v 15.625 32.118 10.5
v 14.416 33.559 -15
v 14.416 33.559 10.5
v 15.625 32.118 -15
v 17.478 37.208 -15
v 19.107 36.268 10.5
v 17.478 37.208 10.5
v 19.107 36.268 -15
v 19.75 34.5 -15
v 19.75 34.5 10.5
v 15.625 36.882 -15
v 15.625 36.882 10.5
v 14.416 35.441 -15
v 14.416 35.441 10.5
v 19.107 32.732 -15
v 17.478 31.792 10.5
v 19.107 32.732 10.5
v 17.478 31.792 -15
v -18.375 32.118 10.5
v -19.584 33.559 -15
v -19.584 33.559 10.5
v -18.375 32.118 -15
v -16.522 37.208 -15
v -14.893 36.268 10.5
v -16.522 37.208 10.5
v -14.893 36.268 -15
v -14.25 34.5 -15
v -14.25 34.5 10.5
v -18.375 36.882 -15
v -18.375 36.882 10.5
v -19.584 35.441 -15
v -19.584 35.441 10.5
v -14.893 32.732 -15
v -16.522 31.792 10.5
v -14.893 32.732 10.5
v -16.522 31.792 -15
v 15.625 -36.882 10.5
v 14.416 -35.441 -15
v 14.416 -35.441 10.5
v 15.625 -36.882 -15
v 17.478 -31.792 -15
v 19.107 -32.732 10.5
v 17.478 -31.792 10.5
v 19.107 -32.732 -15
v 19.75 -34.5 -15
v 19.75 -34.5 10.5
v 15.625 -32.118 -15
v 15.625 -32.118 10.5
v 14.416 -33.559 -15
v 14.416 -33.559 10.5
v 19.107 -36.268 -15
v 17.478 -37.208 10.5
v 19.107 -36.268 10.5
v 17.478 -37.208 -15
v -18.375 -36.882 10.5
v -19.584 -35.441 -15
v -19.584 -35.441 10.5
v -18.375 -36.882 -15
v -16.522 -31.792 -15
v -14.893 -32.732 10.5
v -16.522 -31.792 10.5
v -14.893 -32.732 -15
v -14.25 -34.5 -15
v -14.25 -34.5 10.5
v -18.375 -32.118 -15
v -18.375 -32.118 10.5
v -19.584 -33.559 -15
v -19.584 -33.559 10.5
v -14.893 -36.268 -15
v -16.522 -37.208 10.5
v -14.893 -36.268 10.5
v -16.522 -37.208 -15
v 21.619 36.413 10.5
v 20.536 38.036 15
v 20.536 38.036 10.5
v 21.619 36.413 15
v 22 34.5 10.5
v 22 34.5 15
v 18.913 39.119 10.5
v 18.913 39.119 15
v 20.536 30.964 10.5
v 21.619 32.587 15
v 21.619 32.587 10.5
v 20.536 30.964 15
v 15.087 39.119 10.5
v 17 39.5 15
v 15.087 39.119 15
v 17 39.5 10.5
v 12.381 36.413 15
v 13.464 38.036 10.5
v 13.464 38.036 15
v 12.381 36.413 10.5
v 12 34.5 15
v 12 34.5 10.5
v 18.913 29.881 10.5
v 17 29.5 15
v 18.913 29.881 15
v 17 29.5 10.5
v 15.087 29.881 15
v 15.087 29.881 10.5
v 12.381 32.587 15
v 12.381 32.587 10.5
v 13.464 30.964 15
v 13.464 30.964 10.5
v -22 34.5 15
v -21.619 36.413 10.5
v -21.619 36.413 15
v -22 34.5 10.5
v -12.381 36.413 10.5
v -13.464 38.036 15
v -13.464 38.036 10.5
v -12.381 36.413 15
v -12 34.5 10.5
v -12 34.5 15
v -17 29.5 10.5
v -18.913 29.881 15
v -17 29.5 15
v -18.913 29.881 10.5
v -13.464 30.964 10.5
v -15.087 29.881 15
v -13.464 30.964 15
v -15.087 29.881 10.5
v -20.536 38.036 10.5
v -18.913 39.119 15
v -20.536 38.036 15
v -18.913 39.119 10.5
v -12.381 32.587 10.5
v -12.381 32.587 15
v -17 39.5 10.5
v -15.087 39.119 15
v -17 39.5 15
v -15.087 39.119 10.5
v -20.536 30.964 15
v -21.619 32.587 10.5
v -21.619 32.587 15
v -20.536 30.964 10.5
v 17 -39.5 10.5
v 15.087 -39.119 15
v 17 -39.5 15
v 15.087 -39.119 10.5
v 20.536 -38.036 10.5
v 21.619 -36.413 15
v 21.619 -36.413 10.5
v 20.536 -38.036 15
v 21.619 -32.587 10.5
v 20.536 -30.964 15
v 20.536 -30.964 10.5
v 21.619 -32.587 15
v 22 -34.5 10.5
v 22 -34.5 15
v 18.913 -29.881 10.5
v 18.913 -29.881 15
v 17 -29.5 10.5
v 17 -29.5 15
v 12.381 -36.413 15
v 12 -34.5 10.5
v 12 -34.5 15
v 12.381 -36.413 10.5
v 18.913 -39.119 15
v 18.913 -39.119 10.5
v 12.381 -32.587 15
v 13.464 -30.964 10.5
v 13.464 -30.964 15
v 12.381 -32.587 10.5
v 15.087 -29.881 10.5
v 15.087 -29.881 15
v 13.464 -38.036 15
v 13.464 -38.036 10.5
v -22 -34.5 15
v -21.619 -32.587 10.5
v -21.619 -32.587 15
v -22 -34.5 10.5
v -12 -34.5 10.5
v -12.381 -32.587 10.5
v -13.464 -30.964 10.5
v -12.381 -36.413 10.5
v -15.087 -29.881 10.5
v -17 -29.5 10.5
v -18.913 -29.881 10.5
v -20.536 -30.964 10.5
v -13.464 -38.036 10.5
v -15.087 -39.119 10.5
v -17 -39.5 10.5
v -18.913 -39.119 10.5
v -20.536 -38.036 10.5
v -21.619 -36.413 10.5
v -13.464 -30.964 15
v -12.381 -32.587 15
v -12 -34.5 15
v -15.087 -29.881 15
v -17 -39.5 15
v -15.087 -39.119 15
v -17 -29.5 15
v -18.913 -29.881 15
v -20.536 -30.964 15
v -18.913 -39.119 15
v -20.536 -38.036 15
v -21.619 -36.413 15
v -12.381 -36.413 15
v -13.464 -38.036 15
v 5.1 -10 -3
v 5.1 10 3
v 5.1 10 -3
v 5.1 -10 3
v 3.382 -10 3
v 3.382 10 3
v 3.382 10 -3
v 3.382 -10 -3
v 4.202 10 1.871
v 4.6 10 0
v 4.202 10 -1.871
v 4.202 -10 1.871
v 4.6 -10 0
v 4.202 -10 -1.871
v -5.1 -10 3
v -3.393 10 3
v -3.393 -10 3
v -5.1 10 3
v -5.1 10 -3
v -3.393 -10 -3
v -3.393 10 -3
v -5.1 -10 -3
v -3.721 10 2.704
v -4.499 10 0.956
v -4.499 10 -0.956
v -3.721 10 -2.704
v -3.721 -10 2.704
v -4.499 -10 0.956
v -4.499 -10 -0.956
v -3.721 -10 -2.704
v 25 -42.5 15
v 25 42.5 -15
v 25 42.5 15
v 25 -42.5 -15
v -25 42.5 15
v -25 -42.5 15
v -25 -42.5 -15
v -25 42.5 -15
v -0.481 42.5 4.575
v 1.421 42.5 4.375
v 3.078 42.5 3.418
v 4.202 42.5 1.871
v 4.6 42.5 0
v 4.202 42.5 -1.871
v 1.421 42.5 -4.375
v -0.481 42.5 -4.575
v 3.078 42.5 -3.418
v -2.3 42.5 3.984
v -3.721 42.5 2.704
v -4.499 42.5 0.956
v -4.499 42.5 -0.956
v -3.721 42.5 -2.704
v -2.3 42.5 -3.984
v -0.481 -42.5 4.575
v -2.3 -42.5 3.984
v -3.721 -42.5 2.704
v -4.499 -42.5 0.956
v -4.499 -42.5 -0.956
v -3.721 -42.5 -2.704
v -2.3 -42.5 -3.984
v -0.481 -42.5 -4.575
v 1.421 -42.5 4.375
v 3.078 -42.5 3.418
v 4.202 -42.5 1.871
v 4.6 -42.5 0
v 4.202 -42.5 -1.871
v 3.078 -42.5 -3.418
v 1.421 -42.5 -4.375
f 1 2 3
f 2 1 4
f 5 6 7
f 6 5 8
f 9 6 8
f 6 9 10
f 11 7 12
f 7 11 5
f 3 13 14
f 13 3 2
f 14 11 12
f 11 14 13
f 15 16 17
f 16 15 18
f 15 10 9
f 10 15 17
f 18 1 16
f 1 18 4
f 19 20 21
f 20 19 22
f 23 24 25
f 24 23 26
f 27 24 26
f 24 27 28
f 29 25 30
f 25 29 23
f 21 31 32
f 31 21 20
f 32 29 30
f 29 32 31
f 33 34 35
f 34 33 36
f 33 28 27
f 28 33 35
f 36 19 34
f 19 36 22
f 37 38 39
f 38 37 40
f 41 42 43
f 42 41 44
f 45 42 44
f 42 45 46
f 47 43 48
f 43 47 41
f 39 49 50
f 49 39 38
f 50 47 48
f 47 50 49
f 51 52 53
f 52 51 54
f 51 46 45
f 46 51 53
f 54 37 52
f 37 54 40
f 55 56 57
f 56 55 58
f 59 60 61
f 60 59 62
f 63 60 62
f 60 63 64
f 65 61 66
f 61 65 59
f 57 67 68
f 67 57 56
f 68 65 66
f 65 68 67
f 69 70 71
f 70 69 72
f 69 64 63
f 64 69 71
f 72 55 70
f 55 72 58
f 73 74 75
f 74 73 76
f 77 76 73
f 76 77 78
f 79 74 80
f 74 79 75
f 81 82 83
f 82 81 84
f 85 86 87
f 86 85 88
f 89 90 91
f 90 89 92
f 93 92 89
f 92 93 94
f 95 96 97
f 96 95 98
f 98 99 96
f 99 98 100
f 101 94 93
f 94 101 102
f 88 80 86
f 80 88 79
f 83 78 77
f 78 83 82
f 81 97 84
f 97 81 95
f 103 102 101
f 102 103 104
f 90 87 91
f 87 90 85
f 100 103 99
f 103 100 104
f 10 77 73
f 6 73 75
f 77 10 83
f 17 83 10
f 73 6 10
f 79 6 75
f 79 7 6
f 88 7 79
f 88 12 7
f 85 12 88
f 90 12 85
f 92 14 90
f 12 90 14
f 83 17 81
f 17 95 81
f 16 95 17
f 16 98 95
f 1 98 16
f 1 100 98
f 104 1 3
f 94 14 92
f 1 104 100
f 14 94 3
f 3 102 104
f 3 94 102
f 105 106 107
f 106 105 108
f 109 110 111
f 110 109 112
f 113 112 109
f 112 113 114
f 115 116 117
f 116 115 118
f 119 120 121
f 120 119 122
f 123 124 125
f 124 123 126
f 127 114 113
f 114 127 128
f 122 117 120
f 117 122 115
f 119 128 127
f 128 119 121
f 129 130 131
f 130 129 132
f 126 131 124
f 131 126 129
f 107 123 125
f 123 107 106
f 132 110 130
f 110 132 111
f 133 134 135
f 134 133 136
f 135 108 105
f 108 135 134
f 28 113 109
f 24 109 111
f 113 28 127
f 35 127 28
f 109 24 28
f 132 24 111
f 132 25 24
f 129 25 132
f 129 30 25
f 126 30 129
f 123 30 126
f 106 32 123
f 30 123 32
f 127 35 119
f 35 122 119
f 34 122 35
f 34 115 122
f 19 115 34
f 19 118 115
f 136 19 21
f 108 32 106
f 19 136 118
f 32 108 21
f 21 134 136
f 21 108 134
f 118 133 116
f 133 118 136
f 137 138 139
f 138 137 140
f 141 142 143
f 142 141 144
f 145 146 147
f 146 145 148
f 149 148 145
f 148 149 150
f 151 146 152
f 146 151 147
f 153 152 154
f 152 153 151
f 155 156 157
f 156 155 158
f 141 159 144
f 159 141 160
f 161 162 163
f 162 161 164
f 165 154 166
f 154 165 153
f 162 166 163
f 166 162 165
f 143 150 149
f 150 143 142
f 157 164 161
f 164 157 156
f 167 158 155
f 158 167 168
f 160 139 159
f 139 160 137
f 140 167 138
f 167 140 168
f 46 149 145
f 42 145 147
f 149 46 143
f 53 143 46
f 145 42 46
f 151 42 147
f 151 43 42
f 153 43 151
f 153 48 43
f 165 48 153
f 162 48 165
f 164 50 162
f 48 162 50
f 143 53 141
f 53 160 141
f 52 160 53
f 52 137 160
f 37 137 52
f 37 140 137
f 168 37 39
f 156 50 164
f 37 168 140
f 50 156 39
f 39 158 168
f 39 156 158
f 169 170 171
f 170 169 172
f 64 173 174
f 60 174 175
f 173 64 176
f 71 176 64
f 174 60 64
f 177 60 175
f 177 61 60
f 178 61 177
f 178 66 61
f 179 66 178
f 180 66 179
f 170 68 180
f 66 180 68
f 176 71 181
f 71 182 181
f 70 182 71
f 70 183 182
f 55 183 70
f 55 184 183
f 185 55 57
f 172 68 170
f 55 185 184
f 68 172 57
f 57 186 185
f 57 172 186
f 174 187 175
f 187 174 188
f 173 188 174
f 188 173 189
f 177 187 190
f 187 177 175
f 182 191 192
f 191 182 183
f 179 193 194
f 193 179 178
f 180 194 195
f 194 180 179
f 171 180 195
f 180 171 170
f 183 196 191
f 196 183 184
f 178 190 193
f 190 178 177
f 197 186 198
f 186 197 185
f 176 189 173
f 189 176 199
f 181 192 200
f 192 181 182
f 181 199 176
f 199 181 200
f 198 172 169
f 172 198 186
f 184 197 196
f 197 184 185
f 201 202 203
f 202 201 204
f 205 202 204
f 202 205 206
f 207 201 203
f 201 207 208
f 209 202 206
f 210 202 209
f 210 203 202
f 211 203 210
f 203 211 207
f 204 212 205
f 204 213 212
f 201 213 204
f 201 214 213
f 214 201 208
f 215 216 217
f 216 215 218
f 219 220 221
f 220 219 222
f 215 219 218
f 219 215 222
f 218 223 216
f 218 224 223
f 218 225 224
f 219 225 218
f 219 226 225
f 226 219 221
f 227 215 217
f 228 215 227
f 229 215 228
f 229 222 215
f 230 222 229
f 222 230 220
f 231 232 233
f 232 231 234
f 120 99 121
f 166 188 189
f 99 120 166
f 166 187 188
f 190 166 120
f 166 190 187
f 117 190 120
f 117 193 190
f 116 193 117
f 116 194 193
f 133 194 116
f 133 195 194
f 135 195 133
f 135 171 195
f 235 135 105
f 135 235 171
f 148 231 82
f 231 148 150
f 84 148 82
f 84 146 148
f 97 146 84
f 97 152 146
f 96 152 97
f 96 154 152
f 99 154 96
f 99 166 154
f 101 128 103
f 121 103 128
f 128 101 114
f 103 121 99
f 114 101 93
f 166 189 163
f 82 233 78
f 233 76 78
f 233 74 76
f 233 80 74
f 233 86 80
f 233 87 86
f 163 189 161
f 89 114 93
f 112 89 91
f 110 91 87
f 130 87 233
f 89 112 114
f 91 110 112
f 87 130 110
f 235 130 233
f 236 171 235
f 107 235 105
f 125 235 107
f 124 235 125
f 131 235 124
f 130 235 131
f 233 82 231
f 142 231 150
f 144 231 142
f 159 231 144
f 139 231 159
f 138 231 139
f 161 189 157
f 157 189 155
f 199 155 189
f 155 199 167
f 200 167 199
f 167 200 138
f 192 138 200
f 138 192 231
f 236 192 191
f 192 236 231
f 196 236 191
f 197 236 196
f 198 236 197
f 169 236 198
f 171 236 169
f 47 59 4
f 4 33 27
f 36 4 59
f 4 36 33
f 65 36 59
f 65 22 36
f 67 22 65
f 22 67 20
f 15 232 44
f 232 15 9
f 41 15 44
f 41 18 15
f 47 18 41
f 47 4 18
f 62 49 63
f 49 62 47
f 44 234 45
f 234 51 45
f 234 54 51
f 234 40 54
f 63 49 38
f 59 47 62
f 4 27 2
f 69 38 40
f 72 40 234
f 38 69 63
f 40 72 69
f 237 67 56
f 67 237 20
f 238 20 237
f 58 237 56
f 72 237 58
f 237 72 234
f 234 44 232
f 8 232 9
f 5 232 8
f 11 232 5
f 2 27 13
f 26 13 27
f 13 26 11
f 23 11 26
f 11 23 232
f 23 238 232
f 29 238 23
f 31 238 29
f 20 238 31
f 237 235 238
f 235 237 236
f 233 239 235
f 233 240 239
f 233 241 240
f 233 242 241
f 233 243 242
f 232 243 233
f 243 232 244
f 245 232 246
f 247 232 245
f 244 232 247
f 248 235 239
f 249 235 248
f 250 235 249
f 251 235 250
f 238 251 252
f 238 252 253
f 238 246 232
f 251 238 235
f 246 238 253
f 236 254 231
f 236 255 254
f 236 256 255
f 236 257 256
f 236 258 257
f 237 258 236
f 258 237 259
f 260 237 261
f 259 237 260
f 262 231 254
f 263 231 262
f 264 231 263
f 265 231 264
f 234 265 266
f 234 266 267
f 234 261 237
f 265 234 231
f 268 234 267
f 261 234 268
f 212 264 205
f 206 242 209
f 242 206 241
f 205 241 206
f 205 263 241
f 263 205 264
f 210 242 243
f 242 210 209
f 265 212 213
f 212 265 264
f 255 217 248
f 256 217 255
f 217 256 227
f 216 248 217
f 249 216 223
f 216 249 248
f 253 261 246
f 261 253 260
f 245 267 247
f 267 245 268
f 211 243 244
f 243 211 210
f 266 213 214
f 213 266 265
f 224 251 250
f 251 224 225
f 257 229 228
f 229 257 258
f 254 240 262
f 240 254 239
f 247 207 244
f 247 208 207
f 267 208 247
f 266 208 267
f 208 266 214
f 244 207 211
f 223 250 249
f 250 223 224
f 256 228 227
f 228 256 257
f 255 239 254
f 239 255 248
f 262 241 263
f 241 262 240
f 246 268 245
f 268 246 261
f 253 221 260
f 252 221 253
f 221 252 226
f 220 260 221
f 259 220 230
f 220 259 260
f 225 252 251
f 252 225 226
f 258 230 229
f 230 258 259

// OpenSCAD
// Parameters
shaft_diameter = 9.0; //[4.5:18.0:0.1]
block_width = 50.0; //[25.0:100.0:0.5]
block_length = 85.0; //[42.5:170.0:0.5]
block_height = 30.0; //[15.0:60.0:0.5]
bore_diameter = 9.2; //[9.0:10.0:0.05]
mount_hole_count = 4; //[2:6:1]
mount_hole_diameter = 5.5; //[3.0:8.0:0.1]
edge_margin = 8.0; //[4.0:16.0:0.5]
counterbore_diameter = 10.0; //[7.0:16.0:0.1]
counterbore_depth = 4.0; //[1.5:10.0:0.1]
retention_flat_depth = 1.5; //[0.5:4.0:0.1]
retention_flat_width = 6.0; //[3.0:12.0:0.5]
retention_flat_length = 20.0; //[10.0:60.0:0.5]
overlap = 1.0; //[0.5:2.0:0.1]

// Bearing Block Housing
module scs_bearing_block() {
  color("Silver") {
    cube([block_width, block_length, block_height], center=true);
  }
}

// Shaft Bore
module shaft_bore() {
  rotate([90, 0, 0]) translate([0, 0, 0])
    cylinder(r=bore_diameter/2, h=block_length + 2*overlap, center=true);
}

// Mounting Hole Through
module mounting_hole_through() {
  cylinder(r=mount_hole_diameter/2, h=block_height + 2*overlap, center=true);
}

// Mounting Hole Counterbore
module mounting_hole_counterbore() {
  cylinder(r=counterbore_diameter/2, h=counterbore_depth + overlap, center=true);
}

// Bore Retention Flat Cut
module bore_retention_flat_cut() {
  cube([retention_flat_depth + overlap, retention_flat_length, retention_flat_width], center=true);
}

// Mounting Hole Positions
module sbr_bearing_block_hole_positions() {
  union() {
    translate([(block_width/2 - edge_margin), (block_length/2 - edge_margin), 0]) mounting_hole_through();
    translate([(-block_width/2 + edge_margin), (block_length/2 - edge_margin), 0]) mounting_hole_through();
    translate([(block_width/2 - edge_margin), (-block_length/2 + edge_margin), 0]) mounting_hole_through();
    translate([(-block_width/2 + edge_margin), (-block_length/2 + edge_margin), 0]) mounting_hole_through();
  }
}

// Mounting Hole Counterbore Positions
module scs_bearing_block_hole_positions() {
  union() {
    translate([(block_width/2 - edge_margin), (block_length/2 - edge_margin), (block_height/2 - counterbore_depth/2)]) mounting_hole_counterbore();
    translate([(-block_width/2 + edge_margin), (block_length/2 - edge_margin), (block_height/2 - counterbore_depth/2)]) mounting_hole_counterbore();
    translate([(block_width/2 - edge_margin), (-block_length/2 + edge_margin), (block_height/2 - counterbore_depth/2)]) mounting_hole_counterbore();
    translate([(-block_width/2 + edge_margin), (-block_length/2 + edge_margin), (block_height/2 - counterbore_depth/2)]) mounting_hole_counterbore();
  }
}

// Bore Retention Features
module bore_retention_features() {
  union() {
    translate([(bore_diameter/2 - retention_flat_depth/2), 0, 0]) bore_retention_flat_cut();
    translate([(-bore_diameter/2 + retention_flat_depth/2), 0, 0]) bore_retention_flat_cut();
  }
}

// Final Assembly
module scs_bearing_block_assembly() {
  difference() {
    scs_bearing_block();
    shaft_bore();
    sbr_bearing_block_hole_positions();
    scs_bearing_block_hole_positions();
    bore_retention_features();
  }
}

// Assembly
module assembly() {
  scs_bearing_block_assembly();
}

assembly();
